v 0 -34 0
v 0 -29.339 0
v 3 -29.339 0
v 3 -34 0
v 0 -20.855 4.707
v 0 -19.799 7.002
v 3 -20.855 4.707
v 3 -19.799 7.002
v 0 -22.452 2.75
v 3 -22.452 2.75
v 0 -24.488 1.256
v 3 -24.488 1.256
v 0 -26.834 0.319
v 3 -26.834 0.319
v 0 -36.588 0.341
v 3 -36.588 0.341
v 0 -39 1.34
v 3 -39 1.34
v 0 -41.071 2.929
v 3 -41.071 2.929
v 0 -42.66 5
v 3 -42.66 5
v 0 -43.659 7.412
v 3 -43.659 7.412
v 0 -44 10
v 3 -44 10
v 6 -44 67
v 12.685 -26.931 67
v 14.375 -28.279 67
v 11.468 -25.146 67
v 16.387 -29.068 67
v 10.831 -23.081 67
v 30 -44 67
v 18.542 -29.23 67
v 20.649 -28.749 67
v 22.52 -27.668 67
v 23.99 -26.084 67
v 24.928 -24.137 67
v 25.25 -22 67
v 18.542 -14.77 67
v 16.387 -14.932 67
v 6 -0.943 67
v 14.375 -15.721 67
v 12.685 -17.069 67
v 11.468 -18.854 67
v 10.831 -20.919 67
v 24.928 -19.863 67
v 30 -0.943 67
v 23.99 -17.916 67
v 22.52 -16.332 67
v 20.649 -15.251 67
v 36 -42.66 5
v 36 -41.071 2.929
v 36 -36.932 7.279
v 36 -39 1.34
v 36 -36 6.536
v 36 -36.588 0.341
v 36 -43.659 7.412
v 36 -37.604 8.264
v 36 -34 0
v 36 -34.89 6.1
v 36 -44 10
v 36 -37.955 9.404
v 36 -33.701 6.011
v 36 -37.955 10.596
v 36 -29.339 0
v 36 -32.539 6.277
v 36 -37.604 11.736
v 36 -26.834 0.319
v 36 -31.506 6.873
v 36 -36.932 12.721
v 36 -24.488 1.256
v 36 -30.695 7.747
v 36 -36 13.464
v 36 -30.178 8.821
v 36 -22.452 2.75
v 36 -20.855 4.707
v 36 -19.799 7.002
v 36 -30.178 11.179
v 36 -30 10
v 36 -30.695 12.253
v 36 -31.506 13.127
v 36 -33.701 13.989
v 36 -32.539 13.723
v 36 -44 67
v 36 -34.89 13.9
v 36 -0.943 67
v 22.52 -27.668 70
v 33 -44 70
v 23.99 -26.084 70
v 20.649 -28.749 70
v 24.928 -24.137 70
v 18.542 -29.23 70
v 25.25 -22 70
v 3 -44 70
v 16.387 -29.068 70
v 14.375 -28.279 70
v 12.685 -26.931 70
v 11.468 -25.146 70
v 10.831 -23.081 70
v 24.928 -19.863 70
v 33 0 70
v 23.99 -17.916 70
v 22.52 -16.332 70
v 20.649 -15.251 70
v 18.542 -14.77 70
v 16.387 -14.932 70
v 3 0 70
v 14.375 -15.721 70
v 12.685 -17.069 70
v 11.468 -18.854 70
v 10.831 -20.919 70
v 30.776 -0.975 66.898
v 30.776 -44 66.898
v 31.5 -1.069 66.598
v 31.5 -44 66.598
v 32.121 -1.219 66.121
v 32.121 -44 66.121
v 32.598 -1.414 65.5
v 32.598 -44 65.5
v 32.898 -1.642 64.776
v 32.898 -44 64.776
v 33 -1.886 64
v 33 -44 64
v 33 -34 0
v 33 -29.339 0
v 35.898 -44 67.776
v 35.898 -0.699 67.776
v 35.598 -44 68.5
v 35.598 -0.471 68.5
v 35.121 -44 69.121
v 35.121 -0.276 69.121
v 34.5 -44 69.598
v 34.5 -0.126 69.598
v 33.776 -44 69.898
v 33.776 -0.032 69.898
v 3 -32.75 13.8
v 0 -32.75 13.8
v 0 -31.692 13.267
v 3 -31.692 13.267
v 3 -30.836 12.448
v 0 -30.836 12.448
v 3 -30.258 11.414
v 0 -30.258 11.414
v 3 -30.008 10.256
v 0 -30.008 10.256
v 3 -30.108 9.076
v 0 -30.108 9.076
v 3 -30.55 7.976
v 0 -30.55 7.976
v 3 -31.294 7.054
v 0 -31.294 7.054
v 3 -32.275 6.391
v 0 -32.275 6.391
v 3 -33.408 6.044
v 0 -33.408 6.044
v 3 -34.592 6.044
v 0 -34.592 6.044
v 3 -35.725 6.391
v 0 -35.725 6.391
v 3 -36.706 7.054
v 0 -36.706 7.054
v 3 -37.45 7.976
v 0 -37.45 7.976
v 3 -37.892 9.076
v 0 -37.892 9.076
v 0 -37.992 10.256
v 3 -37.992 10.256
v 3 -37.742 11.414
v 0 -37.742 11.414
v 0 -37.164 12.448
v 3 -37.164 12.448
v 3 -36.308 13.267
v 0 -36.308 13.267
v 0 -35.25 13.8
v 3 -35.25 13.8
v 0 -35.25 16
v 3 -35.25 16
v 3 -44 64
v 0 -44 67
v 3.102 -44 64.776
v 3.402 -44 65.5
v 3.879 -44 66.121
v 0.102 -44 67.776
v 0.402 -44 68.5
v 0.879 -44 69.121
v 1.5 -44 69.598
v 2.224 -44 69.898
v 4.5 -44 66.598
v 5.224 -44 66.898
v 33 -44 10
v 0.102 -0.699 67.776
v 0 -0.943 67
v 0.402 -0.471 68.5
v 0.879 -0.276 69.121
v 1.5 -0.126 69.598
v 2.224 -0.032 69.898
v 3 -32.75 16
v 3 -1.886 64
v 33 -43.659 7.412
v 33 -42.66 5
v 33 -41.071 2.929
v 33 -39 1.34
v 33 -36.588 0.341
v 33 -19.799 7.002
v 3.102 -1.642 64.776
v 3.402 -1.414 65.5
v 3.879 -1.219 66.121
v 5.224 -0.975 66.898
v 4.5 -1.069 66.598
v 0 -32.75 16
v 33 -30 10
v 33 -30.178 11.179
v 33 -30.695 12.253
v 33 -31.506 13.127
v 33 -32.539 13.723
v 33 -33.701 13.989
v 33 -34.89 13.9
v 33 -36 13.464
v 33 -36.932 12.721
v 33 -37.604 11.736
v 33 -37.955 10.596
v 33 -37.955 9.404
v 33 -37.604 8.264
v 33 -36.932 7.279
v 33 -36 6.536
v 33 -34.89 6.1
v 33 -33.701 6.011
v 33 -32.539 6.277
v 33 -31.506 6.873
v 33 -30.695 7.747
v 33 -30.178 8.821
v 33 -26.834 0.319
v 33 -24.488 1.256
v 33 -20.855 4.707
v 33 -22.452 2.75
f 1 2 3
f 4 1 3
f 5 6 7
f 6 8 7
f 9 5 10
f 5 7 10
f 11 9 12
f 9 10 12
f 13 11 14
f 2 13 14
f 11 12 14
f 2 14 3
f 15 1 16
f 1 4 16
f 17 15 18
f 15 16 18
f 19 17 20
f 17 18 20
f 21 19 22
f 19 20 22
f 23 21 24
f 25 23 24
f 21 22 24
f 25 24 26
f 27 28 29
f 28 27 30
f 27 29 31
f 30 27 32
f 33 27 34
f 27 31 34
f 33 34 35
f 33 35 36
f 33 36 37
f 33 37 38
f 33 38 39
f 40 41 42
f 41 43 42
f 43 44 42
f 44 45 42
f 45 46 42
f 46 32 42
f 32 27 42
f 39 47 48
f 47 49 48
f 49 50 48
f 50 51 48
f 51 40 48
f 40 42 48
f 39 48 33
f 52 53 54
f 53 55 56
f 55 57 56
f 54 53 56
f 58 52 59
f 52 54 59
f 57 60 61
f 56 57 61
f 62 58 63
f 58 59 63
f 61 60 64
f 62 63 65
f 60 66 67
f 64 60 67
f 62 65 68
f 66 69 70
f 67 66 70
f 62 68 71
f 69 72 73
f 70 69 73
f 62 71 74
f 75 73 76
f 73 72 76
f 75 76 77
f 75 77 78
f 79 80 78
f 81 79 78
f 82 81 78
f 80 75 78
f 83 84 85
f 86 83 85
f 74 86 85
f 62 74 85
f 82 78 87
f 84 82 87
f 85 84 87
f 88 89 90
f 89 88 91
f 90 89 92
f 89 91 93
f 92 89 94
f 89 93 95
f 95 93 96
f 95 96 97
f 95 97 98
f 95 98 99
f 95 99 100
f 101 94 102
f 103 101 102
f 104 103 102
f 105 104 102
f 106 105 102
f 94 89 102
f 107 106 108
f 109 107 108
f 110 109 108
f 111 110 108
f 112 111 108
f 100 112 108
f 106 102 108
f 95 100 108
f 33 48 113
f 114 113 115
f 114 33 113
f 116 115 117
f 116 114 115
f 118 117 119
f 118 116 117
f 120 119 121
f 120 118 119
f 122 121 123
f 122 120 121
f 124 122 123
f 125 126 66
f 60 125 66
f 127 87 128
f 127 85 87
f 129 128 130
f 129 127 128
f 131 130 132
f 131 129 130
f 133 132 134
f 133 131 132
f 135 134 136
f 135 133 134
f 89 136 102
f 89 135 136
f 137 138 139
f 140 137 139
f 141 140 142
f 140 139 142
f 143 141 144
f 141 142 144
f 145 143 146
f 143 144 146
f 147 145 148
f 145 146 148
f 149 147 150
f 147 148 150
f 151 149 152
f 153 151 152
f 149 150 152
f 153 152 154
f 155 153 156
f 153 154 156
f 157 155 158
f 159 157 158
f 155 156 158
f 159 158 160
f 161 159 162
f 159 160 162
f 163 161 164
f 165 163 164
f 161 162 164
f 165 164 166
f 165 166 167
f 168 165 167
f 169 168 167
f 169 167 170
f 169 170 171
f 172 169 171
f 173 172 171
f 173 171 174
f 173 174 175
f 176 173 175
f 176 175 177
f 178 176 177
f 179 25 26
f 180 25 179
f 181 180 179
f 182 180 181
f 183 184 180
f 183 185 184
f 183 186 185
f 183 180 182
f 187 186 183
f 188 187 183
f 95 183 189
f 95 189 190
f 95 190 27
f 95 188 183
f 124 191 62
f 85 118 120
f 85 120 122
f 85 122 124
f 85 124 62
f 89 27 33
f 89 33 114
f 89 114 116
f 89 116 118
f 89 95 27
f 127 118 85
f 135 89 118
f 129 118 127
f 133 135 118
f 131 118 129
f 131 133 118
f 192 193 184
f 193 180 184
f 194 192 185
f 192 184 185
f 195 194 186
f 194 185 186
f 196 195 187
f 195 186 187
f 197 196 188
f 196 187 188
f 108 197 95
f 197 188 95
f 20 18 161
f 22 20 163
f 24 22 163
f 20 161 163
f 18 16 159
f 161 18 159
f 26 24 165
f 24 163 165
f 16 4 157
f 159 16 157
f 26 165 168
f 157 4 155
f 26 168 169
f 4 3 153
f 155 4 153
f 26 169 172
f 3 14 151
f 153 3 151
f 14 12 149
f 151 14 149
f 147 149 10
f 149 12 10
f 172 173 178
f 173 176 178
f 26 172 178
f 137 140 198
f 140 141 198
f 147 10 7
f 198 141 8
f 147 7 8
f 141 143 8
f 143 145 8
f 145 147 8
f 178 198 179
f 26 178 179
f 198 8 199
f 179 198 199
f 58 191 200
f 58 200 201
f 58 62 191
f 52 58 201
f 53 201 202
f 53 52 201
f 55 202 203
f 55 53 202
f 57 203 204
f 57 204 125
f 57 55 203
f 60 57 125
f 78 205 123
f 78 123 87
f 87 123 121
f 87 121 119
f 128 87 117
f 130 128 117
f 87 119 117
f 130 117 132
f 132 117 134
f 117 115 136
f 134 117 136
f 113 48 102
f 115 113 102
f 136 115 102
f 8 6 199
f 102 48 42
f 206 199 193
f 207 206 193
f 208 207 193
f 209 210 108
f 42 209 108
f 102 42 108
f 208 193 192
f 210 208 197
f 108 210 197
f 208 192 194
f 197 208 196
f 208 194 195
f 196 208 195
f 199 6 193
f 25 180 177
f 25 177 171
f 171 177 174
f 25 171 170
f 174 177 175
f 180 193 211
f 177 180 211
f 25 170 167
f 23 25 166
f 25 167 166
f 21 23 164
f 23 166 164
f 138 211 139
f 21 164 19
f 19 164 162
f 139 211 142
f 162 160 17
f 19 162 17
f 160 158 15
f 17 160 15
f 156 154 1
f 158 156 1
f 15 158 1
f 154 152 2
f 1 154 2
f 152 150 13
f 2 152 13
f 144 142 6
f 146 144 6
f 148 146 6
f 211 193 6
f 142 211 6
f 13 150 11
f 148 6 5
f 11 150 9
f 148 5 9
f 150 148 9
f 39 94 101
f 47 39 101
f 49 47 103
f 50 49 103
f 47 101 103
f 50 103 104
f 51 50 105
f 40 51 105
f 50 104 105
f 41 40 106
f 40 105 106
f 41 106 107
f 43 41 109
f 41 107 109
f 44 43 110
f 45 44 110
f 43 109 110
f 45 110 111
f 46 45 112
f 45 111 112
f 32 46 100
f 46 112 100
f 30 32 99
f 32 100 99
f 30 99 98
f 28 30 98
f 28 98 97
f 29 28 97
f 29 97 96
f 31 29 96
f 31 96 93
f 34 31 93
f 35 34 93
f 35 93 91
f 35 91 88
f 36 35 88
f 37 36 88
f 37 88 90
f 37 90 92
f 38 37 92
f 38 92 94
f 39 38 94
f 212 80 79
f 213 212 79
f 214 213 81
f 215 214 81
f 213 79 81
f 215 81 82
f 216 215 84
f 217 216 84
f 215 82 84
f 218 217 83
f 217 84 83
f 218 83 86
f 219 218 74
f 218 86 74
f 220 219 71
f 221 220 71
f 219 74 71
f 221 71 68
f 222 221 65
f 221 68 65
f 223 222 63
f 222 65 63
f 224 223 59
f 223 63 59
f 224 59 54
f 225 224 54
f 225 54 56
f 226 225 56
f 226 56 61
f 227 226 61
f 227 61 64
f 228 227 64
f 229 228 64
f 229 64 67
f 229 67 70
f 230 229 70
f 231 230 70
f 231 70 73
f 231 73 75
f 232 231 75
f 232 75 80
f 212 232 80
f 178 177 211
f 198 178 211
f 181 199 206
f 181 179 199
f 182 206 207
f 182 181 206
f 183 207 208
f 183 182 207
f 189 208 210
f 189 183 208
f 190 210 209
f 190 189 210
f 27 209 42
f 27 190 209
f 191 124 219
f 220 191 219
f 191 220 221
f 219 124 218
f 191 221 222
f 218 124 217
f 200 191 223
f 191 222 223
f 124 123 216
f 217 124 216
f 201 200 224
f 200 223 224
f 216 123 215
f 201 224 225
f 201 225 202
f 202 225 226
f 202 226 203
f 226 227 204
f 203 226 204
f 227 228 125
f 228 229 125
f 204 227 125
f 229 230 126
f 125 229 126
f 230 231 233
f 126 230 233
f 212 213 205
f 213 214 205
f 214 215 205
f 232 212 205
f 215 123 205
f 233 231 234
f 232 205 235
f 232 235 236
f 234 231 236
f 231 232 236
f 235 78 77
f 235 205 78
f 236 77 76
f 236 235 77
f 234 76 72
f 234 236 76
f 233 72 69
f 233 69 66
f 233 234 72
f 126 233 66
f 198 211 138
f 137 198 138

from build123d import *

# Parameters (mm, degrees)
F1_DEPTH  = 44
F3_R      = 4
F4_DEPTH  = 25
F6_DEPTH  = 25
F7_R      = 3
F8_R      = 10
F9_R      = 7.25
F10_DEPTH = 25


with BuildPart() as f1:
    # F0 (on Front) → F1 (new body)
    with BuildSketch(Plane.XZ):
        Polygon((0, 70), (0, 0), (3, 0), (3, 67), (33, 67), (33, 0), (36, 0), (36, 70), align=None)
    extrude(amount=F1_DEPTH)

    # F2 (on face) + F3 (on face) → F4 (cut)
    with BuildSketch(Plane.YZ.offset(36)):
        Polygon((0, 0), (0, 70), (-22, 0), align=None)
    with BuildSketch(Plane.YZ.offset(36)):
        with Locations((-34, 10)):
            Circle(F3_R)
    extrude(amount=-F4_DEPTH, mode=Mode.SUBTRACT)

    # F5 (on face) → F6 (cut)
    with BuildSketch(Plane(origin=(0, 0, 0), x_dir=(0, -1, 0), z_dir=(-1, 0, 0))):
        Polygon((22, 0), (0, 70), (0, 0), align=None)
        with BuildLine():
            Line((32.75, 16), (32.75, 13.7996710384))
            ThreePointArc((32.75, 13.7996710384), (34, 6), (35.25, 13.7996710384))
            Line((35.25, 13.7996710384), (35.25, 16))
            Line((35.25, 16), (34, 16))
            Line((34, 16), (32.75, 16))
        make_face()
    extrude(amount=-F6_DEPTH, mode=Mode.SUBTRACT)

    # F7
    f7_edges = [f1.edges().sort_by_distance(p)[0] for p in [
        (33, -22.471429, 67),
        (3, -22.471429, 67),
        (36, -22, 70),
        (0, -22, 70),
    ]]
    fillet(f7_edges, radius=F7_R)

    # F8
    f8_edges = [f1.edges().sort_by_distance(p)[0] for p in [
        (1.5, -44, 0),
        (34.5, -44, 0),
        (1.5, -22, 0),
        (34.5, -22, 0),
    ]]
    fillet(f8_edges, radius=F8_R)

    # F9 (on face) → F10 (cut)
    with BuildSketch(Plane.XY.offset(70)):
        with Locations((18, -22)):
            Circle(F9_R)
    extrude(amount=-F10_DEPTH, mode=Mode.SUBTRACT)


solid = f1.part
